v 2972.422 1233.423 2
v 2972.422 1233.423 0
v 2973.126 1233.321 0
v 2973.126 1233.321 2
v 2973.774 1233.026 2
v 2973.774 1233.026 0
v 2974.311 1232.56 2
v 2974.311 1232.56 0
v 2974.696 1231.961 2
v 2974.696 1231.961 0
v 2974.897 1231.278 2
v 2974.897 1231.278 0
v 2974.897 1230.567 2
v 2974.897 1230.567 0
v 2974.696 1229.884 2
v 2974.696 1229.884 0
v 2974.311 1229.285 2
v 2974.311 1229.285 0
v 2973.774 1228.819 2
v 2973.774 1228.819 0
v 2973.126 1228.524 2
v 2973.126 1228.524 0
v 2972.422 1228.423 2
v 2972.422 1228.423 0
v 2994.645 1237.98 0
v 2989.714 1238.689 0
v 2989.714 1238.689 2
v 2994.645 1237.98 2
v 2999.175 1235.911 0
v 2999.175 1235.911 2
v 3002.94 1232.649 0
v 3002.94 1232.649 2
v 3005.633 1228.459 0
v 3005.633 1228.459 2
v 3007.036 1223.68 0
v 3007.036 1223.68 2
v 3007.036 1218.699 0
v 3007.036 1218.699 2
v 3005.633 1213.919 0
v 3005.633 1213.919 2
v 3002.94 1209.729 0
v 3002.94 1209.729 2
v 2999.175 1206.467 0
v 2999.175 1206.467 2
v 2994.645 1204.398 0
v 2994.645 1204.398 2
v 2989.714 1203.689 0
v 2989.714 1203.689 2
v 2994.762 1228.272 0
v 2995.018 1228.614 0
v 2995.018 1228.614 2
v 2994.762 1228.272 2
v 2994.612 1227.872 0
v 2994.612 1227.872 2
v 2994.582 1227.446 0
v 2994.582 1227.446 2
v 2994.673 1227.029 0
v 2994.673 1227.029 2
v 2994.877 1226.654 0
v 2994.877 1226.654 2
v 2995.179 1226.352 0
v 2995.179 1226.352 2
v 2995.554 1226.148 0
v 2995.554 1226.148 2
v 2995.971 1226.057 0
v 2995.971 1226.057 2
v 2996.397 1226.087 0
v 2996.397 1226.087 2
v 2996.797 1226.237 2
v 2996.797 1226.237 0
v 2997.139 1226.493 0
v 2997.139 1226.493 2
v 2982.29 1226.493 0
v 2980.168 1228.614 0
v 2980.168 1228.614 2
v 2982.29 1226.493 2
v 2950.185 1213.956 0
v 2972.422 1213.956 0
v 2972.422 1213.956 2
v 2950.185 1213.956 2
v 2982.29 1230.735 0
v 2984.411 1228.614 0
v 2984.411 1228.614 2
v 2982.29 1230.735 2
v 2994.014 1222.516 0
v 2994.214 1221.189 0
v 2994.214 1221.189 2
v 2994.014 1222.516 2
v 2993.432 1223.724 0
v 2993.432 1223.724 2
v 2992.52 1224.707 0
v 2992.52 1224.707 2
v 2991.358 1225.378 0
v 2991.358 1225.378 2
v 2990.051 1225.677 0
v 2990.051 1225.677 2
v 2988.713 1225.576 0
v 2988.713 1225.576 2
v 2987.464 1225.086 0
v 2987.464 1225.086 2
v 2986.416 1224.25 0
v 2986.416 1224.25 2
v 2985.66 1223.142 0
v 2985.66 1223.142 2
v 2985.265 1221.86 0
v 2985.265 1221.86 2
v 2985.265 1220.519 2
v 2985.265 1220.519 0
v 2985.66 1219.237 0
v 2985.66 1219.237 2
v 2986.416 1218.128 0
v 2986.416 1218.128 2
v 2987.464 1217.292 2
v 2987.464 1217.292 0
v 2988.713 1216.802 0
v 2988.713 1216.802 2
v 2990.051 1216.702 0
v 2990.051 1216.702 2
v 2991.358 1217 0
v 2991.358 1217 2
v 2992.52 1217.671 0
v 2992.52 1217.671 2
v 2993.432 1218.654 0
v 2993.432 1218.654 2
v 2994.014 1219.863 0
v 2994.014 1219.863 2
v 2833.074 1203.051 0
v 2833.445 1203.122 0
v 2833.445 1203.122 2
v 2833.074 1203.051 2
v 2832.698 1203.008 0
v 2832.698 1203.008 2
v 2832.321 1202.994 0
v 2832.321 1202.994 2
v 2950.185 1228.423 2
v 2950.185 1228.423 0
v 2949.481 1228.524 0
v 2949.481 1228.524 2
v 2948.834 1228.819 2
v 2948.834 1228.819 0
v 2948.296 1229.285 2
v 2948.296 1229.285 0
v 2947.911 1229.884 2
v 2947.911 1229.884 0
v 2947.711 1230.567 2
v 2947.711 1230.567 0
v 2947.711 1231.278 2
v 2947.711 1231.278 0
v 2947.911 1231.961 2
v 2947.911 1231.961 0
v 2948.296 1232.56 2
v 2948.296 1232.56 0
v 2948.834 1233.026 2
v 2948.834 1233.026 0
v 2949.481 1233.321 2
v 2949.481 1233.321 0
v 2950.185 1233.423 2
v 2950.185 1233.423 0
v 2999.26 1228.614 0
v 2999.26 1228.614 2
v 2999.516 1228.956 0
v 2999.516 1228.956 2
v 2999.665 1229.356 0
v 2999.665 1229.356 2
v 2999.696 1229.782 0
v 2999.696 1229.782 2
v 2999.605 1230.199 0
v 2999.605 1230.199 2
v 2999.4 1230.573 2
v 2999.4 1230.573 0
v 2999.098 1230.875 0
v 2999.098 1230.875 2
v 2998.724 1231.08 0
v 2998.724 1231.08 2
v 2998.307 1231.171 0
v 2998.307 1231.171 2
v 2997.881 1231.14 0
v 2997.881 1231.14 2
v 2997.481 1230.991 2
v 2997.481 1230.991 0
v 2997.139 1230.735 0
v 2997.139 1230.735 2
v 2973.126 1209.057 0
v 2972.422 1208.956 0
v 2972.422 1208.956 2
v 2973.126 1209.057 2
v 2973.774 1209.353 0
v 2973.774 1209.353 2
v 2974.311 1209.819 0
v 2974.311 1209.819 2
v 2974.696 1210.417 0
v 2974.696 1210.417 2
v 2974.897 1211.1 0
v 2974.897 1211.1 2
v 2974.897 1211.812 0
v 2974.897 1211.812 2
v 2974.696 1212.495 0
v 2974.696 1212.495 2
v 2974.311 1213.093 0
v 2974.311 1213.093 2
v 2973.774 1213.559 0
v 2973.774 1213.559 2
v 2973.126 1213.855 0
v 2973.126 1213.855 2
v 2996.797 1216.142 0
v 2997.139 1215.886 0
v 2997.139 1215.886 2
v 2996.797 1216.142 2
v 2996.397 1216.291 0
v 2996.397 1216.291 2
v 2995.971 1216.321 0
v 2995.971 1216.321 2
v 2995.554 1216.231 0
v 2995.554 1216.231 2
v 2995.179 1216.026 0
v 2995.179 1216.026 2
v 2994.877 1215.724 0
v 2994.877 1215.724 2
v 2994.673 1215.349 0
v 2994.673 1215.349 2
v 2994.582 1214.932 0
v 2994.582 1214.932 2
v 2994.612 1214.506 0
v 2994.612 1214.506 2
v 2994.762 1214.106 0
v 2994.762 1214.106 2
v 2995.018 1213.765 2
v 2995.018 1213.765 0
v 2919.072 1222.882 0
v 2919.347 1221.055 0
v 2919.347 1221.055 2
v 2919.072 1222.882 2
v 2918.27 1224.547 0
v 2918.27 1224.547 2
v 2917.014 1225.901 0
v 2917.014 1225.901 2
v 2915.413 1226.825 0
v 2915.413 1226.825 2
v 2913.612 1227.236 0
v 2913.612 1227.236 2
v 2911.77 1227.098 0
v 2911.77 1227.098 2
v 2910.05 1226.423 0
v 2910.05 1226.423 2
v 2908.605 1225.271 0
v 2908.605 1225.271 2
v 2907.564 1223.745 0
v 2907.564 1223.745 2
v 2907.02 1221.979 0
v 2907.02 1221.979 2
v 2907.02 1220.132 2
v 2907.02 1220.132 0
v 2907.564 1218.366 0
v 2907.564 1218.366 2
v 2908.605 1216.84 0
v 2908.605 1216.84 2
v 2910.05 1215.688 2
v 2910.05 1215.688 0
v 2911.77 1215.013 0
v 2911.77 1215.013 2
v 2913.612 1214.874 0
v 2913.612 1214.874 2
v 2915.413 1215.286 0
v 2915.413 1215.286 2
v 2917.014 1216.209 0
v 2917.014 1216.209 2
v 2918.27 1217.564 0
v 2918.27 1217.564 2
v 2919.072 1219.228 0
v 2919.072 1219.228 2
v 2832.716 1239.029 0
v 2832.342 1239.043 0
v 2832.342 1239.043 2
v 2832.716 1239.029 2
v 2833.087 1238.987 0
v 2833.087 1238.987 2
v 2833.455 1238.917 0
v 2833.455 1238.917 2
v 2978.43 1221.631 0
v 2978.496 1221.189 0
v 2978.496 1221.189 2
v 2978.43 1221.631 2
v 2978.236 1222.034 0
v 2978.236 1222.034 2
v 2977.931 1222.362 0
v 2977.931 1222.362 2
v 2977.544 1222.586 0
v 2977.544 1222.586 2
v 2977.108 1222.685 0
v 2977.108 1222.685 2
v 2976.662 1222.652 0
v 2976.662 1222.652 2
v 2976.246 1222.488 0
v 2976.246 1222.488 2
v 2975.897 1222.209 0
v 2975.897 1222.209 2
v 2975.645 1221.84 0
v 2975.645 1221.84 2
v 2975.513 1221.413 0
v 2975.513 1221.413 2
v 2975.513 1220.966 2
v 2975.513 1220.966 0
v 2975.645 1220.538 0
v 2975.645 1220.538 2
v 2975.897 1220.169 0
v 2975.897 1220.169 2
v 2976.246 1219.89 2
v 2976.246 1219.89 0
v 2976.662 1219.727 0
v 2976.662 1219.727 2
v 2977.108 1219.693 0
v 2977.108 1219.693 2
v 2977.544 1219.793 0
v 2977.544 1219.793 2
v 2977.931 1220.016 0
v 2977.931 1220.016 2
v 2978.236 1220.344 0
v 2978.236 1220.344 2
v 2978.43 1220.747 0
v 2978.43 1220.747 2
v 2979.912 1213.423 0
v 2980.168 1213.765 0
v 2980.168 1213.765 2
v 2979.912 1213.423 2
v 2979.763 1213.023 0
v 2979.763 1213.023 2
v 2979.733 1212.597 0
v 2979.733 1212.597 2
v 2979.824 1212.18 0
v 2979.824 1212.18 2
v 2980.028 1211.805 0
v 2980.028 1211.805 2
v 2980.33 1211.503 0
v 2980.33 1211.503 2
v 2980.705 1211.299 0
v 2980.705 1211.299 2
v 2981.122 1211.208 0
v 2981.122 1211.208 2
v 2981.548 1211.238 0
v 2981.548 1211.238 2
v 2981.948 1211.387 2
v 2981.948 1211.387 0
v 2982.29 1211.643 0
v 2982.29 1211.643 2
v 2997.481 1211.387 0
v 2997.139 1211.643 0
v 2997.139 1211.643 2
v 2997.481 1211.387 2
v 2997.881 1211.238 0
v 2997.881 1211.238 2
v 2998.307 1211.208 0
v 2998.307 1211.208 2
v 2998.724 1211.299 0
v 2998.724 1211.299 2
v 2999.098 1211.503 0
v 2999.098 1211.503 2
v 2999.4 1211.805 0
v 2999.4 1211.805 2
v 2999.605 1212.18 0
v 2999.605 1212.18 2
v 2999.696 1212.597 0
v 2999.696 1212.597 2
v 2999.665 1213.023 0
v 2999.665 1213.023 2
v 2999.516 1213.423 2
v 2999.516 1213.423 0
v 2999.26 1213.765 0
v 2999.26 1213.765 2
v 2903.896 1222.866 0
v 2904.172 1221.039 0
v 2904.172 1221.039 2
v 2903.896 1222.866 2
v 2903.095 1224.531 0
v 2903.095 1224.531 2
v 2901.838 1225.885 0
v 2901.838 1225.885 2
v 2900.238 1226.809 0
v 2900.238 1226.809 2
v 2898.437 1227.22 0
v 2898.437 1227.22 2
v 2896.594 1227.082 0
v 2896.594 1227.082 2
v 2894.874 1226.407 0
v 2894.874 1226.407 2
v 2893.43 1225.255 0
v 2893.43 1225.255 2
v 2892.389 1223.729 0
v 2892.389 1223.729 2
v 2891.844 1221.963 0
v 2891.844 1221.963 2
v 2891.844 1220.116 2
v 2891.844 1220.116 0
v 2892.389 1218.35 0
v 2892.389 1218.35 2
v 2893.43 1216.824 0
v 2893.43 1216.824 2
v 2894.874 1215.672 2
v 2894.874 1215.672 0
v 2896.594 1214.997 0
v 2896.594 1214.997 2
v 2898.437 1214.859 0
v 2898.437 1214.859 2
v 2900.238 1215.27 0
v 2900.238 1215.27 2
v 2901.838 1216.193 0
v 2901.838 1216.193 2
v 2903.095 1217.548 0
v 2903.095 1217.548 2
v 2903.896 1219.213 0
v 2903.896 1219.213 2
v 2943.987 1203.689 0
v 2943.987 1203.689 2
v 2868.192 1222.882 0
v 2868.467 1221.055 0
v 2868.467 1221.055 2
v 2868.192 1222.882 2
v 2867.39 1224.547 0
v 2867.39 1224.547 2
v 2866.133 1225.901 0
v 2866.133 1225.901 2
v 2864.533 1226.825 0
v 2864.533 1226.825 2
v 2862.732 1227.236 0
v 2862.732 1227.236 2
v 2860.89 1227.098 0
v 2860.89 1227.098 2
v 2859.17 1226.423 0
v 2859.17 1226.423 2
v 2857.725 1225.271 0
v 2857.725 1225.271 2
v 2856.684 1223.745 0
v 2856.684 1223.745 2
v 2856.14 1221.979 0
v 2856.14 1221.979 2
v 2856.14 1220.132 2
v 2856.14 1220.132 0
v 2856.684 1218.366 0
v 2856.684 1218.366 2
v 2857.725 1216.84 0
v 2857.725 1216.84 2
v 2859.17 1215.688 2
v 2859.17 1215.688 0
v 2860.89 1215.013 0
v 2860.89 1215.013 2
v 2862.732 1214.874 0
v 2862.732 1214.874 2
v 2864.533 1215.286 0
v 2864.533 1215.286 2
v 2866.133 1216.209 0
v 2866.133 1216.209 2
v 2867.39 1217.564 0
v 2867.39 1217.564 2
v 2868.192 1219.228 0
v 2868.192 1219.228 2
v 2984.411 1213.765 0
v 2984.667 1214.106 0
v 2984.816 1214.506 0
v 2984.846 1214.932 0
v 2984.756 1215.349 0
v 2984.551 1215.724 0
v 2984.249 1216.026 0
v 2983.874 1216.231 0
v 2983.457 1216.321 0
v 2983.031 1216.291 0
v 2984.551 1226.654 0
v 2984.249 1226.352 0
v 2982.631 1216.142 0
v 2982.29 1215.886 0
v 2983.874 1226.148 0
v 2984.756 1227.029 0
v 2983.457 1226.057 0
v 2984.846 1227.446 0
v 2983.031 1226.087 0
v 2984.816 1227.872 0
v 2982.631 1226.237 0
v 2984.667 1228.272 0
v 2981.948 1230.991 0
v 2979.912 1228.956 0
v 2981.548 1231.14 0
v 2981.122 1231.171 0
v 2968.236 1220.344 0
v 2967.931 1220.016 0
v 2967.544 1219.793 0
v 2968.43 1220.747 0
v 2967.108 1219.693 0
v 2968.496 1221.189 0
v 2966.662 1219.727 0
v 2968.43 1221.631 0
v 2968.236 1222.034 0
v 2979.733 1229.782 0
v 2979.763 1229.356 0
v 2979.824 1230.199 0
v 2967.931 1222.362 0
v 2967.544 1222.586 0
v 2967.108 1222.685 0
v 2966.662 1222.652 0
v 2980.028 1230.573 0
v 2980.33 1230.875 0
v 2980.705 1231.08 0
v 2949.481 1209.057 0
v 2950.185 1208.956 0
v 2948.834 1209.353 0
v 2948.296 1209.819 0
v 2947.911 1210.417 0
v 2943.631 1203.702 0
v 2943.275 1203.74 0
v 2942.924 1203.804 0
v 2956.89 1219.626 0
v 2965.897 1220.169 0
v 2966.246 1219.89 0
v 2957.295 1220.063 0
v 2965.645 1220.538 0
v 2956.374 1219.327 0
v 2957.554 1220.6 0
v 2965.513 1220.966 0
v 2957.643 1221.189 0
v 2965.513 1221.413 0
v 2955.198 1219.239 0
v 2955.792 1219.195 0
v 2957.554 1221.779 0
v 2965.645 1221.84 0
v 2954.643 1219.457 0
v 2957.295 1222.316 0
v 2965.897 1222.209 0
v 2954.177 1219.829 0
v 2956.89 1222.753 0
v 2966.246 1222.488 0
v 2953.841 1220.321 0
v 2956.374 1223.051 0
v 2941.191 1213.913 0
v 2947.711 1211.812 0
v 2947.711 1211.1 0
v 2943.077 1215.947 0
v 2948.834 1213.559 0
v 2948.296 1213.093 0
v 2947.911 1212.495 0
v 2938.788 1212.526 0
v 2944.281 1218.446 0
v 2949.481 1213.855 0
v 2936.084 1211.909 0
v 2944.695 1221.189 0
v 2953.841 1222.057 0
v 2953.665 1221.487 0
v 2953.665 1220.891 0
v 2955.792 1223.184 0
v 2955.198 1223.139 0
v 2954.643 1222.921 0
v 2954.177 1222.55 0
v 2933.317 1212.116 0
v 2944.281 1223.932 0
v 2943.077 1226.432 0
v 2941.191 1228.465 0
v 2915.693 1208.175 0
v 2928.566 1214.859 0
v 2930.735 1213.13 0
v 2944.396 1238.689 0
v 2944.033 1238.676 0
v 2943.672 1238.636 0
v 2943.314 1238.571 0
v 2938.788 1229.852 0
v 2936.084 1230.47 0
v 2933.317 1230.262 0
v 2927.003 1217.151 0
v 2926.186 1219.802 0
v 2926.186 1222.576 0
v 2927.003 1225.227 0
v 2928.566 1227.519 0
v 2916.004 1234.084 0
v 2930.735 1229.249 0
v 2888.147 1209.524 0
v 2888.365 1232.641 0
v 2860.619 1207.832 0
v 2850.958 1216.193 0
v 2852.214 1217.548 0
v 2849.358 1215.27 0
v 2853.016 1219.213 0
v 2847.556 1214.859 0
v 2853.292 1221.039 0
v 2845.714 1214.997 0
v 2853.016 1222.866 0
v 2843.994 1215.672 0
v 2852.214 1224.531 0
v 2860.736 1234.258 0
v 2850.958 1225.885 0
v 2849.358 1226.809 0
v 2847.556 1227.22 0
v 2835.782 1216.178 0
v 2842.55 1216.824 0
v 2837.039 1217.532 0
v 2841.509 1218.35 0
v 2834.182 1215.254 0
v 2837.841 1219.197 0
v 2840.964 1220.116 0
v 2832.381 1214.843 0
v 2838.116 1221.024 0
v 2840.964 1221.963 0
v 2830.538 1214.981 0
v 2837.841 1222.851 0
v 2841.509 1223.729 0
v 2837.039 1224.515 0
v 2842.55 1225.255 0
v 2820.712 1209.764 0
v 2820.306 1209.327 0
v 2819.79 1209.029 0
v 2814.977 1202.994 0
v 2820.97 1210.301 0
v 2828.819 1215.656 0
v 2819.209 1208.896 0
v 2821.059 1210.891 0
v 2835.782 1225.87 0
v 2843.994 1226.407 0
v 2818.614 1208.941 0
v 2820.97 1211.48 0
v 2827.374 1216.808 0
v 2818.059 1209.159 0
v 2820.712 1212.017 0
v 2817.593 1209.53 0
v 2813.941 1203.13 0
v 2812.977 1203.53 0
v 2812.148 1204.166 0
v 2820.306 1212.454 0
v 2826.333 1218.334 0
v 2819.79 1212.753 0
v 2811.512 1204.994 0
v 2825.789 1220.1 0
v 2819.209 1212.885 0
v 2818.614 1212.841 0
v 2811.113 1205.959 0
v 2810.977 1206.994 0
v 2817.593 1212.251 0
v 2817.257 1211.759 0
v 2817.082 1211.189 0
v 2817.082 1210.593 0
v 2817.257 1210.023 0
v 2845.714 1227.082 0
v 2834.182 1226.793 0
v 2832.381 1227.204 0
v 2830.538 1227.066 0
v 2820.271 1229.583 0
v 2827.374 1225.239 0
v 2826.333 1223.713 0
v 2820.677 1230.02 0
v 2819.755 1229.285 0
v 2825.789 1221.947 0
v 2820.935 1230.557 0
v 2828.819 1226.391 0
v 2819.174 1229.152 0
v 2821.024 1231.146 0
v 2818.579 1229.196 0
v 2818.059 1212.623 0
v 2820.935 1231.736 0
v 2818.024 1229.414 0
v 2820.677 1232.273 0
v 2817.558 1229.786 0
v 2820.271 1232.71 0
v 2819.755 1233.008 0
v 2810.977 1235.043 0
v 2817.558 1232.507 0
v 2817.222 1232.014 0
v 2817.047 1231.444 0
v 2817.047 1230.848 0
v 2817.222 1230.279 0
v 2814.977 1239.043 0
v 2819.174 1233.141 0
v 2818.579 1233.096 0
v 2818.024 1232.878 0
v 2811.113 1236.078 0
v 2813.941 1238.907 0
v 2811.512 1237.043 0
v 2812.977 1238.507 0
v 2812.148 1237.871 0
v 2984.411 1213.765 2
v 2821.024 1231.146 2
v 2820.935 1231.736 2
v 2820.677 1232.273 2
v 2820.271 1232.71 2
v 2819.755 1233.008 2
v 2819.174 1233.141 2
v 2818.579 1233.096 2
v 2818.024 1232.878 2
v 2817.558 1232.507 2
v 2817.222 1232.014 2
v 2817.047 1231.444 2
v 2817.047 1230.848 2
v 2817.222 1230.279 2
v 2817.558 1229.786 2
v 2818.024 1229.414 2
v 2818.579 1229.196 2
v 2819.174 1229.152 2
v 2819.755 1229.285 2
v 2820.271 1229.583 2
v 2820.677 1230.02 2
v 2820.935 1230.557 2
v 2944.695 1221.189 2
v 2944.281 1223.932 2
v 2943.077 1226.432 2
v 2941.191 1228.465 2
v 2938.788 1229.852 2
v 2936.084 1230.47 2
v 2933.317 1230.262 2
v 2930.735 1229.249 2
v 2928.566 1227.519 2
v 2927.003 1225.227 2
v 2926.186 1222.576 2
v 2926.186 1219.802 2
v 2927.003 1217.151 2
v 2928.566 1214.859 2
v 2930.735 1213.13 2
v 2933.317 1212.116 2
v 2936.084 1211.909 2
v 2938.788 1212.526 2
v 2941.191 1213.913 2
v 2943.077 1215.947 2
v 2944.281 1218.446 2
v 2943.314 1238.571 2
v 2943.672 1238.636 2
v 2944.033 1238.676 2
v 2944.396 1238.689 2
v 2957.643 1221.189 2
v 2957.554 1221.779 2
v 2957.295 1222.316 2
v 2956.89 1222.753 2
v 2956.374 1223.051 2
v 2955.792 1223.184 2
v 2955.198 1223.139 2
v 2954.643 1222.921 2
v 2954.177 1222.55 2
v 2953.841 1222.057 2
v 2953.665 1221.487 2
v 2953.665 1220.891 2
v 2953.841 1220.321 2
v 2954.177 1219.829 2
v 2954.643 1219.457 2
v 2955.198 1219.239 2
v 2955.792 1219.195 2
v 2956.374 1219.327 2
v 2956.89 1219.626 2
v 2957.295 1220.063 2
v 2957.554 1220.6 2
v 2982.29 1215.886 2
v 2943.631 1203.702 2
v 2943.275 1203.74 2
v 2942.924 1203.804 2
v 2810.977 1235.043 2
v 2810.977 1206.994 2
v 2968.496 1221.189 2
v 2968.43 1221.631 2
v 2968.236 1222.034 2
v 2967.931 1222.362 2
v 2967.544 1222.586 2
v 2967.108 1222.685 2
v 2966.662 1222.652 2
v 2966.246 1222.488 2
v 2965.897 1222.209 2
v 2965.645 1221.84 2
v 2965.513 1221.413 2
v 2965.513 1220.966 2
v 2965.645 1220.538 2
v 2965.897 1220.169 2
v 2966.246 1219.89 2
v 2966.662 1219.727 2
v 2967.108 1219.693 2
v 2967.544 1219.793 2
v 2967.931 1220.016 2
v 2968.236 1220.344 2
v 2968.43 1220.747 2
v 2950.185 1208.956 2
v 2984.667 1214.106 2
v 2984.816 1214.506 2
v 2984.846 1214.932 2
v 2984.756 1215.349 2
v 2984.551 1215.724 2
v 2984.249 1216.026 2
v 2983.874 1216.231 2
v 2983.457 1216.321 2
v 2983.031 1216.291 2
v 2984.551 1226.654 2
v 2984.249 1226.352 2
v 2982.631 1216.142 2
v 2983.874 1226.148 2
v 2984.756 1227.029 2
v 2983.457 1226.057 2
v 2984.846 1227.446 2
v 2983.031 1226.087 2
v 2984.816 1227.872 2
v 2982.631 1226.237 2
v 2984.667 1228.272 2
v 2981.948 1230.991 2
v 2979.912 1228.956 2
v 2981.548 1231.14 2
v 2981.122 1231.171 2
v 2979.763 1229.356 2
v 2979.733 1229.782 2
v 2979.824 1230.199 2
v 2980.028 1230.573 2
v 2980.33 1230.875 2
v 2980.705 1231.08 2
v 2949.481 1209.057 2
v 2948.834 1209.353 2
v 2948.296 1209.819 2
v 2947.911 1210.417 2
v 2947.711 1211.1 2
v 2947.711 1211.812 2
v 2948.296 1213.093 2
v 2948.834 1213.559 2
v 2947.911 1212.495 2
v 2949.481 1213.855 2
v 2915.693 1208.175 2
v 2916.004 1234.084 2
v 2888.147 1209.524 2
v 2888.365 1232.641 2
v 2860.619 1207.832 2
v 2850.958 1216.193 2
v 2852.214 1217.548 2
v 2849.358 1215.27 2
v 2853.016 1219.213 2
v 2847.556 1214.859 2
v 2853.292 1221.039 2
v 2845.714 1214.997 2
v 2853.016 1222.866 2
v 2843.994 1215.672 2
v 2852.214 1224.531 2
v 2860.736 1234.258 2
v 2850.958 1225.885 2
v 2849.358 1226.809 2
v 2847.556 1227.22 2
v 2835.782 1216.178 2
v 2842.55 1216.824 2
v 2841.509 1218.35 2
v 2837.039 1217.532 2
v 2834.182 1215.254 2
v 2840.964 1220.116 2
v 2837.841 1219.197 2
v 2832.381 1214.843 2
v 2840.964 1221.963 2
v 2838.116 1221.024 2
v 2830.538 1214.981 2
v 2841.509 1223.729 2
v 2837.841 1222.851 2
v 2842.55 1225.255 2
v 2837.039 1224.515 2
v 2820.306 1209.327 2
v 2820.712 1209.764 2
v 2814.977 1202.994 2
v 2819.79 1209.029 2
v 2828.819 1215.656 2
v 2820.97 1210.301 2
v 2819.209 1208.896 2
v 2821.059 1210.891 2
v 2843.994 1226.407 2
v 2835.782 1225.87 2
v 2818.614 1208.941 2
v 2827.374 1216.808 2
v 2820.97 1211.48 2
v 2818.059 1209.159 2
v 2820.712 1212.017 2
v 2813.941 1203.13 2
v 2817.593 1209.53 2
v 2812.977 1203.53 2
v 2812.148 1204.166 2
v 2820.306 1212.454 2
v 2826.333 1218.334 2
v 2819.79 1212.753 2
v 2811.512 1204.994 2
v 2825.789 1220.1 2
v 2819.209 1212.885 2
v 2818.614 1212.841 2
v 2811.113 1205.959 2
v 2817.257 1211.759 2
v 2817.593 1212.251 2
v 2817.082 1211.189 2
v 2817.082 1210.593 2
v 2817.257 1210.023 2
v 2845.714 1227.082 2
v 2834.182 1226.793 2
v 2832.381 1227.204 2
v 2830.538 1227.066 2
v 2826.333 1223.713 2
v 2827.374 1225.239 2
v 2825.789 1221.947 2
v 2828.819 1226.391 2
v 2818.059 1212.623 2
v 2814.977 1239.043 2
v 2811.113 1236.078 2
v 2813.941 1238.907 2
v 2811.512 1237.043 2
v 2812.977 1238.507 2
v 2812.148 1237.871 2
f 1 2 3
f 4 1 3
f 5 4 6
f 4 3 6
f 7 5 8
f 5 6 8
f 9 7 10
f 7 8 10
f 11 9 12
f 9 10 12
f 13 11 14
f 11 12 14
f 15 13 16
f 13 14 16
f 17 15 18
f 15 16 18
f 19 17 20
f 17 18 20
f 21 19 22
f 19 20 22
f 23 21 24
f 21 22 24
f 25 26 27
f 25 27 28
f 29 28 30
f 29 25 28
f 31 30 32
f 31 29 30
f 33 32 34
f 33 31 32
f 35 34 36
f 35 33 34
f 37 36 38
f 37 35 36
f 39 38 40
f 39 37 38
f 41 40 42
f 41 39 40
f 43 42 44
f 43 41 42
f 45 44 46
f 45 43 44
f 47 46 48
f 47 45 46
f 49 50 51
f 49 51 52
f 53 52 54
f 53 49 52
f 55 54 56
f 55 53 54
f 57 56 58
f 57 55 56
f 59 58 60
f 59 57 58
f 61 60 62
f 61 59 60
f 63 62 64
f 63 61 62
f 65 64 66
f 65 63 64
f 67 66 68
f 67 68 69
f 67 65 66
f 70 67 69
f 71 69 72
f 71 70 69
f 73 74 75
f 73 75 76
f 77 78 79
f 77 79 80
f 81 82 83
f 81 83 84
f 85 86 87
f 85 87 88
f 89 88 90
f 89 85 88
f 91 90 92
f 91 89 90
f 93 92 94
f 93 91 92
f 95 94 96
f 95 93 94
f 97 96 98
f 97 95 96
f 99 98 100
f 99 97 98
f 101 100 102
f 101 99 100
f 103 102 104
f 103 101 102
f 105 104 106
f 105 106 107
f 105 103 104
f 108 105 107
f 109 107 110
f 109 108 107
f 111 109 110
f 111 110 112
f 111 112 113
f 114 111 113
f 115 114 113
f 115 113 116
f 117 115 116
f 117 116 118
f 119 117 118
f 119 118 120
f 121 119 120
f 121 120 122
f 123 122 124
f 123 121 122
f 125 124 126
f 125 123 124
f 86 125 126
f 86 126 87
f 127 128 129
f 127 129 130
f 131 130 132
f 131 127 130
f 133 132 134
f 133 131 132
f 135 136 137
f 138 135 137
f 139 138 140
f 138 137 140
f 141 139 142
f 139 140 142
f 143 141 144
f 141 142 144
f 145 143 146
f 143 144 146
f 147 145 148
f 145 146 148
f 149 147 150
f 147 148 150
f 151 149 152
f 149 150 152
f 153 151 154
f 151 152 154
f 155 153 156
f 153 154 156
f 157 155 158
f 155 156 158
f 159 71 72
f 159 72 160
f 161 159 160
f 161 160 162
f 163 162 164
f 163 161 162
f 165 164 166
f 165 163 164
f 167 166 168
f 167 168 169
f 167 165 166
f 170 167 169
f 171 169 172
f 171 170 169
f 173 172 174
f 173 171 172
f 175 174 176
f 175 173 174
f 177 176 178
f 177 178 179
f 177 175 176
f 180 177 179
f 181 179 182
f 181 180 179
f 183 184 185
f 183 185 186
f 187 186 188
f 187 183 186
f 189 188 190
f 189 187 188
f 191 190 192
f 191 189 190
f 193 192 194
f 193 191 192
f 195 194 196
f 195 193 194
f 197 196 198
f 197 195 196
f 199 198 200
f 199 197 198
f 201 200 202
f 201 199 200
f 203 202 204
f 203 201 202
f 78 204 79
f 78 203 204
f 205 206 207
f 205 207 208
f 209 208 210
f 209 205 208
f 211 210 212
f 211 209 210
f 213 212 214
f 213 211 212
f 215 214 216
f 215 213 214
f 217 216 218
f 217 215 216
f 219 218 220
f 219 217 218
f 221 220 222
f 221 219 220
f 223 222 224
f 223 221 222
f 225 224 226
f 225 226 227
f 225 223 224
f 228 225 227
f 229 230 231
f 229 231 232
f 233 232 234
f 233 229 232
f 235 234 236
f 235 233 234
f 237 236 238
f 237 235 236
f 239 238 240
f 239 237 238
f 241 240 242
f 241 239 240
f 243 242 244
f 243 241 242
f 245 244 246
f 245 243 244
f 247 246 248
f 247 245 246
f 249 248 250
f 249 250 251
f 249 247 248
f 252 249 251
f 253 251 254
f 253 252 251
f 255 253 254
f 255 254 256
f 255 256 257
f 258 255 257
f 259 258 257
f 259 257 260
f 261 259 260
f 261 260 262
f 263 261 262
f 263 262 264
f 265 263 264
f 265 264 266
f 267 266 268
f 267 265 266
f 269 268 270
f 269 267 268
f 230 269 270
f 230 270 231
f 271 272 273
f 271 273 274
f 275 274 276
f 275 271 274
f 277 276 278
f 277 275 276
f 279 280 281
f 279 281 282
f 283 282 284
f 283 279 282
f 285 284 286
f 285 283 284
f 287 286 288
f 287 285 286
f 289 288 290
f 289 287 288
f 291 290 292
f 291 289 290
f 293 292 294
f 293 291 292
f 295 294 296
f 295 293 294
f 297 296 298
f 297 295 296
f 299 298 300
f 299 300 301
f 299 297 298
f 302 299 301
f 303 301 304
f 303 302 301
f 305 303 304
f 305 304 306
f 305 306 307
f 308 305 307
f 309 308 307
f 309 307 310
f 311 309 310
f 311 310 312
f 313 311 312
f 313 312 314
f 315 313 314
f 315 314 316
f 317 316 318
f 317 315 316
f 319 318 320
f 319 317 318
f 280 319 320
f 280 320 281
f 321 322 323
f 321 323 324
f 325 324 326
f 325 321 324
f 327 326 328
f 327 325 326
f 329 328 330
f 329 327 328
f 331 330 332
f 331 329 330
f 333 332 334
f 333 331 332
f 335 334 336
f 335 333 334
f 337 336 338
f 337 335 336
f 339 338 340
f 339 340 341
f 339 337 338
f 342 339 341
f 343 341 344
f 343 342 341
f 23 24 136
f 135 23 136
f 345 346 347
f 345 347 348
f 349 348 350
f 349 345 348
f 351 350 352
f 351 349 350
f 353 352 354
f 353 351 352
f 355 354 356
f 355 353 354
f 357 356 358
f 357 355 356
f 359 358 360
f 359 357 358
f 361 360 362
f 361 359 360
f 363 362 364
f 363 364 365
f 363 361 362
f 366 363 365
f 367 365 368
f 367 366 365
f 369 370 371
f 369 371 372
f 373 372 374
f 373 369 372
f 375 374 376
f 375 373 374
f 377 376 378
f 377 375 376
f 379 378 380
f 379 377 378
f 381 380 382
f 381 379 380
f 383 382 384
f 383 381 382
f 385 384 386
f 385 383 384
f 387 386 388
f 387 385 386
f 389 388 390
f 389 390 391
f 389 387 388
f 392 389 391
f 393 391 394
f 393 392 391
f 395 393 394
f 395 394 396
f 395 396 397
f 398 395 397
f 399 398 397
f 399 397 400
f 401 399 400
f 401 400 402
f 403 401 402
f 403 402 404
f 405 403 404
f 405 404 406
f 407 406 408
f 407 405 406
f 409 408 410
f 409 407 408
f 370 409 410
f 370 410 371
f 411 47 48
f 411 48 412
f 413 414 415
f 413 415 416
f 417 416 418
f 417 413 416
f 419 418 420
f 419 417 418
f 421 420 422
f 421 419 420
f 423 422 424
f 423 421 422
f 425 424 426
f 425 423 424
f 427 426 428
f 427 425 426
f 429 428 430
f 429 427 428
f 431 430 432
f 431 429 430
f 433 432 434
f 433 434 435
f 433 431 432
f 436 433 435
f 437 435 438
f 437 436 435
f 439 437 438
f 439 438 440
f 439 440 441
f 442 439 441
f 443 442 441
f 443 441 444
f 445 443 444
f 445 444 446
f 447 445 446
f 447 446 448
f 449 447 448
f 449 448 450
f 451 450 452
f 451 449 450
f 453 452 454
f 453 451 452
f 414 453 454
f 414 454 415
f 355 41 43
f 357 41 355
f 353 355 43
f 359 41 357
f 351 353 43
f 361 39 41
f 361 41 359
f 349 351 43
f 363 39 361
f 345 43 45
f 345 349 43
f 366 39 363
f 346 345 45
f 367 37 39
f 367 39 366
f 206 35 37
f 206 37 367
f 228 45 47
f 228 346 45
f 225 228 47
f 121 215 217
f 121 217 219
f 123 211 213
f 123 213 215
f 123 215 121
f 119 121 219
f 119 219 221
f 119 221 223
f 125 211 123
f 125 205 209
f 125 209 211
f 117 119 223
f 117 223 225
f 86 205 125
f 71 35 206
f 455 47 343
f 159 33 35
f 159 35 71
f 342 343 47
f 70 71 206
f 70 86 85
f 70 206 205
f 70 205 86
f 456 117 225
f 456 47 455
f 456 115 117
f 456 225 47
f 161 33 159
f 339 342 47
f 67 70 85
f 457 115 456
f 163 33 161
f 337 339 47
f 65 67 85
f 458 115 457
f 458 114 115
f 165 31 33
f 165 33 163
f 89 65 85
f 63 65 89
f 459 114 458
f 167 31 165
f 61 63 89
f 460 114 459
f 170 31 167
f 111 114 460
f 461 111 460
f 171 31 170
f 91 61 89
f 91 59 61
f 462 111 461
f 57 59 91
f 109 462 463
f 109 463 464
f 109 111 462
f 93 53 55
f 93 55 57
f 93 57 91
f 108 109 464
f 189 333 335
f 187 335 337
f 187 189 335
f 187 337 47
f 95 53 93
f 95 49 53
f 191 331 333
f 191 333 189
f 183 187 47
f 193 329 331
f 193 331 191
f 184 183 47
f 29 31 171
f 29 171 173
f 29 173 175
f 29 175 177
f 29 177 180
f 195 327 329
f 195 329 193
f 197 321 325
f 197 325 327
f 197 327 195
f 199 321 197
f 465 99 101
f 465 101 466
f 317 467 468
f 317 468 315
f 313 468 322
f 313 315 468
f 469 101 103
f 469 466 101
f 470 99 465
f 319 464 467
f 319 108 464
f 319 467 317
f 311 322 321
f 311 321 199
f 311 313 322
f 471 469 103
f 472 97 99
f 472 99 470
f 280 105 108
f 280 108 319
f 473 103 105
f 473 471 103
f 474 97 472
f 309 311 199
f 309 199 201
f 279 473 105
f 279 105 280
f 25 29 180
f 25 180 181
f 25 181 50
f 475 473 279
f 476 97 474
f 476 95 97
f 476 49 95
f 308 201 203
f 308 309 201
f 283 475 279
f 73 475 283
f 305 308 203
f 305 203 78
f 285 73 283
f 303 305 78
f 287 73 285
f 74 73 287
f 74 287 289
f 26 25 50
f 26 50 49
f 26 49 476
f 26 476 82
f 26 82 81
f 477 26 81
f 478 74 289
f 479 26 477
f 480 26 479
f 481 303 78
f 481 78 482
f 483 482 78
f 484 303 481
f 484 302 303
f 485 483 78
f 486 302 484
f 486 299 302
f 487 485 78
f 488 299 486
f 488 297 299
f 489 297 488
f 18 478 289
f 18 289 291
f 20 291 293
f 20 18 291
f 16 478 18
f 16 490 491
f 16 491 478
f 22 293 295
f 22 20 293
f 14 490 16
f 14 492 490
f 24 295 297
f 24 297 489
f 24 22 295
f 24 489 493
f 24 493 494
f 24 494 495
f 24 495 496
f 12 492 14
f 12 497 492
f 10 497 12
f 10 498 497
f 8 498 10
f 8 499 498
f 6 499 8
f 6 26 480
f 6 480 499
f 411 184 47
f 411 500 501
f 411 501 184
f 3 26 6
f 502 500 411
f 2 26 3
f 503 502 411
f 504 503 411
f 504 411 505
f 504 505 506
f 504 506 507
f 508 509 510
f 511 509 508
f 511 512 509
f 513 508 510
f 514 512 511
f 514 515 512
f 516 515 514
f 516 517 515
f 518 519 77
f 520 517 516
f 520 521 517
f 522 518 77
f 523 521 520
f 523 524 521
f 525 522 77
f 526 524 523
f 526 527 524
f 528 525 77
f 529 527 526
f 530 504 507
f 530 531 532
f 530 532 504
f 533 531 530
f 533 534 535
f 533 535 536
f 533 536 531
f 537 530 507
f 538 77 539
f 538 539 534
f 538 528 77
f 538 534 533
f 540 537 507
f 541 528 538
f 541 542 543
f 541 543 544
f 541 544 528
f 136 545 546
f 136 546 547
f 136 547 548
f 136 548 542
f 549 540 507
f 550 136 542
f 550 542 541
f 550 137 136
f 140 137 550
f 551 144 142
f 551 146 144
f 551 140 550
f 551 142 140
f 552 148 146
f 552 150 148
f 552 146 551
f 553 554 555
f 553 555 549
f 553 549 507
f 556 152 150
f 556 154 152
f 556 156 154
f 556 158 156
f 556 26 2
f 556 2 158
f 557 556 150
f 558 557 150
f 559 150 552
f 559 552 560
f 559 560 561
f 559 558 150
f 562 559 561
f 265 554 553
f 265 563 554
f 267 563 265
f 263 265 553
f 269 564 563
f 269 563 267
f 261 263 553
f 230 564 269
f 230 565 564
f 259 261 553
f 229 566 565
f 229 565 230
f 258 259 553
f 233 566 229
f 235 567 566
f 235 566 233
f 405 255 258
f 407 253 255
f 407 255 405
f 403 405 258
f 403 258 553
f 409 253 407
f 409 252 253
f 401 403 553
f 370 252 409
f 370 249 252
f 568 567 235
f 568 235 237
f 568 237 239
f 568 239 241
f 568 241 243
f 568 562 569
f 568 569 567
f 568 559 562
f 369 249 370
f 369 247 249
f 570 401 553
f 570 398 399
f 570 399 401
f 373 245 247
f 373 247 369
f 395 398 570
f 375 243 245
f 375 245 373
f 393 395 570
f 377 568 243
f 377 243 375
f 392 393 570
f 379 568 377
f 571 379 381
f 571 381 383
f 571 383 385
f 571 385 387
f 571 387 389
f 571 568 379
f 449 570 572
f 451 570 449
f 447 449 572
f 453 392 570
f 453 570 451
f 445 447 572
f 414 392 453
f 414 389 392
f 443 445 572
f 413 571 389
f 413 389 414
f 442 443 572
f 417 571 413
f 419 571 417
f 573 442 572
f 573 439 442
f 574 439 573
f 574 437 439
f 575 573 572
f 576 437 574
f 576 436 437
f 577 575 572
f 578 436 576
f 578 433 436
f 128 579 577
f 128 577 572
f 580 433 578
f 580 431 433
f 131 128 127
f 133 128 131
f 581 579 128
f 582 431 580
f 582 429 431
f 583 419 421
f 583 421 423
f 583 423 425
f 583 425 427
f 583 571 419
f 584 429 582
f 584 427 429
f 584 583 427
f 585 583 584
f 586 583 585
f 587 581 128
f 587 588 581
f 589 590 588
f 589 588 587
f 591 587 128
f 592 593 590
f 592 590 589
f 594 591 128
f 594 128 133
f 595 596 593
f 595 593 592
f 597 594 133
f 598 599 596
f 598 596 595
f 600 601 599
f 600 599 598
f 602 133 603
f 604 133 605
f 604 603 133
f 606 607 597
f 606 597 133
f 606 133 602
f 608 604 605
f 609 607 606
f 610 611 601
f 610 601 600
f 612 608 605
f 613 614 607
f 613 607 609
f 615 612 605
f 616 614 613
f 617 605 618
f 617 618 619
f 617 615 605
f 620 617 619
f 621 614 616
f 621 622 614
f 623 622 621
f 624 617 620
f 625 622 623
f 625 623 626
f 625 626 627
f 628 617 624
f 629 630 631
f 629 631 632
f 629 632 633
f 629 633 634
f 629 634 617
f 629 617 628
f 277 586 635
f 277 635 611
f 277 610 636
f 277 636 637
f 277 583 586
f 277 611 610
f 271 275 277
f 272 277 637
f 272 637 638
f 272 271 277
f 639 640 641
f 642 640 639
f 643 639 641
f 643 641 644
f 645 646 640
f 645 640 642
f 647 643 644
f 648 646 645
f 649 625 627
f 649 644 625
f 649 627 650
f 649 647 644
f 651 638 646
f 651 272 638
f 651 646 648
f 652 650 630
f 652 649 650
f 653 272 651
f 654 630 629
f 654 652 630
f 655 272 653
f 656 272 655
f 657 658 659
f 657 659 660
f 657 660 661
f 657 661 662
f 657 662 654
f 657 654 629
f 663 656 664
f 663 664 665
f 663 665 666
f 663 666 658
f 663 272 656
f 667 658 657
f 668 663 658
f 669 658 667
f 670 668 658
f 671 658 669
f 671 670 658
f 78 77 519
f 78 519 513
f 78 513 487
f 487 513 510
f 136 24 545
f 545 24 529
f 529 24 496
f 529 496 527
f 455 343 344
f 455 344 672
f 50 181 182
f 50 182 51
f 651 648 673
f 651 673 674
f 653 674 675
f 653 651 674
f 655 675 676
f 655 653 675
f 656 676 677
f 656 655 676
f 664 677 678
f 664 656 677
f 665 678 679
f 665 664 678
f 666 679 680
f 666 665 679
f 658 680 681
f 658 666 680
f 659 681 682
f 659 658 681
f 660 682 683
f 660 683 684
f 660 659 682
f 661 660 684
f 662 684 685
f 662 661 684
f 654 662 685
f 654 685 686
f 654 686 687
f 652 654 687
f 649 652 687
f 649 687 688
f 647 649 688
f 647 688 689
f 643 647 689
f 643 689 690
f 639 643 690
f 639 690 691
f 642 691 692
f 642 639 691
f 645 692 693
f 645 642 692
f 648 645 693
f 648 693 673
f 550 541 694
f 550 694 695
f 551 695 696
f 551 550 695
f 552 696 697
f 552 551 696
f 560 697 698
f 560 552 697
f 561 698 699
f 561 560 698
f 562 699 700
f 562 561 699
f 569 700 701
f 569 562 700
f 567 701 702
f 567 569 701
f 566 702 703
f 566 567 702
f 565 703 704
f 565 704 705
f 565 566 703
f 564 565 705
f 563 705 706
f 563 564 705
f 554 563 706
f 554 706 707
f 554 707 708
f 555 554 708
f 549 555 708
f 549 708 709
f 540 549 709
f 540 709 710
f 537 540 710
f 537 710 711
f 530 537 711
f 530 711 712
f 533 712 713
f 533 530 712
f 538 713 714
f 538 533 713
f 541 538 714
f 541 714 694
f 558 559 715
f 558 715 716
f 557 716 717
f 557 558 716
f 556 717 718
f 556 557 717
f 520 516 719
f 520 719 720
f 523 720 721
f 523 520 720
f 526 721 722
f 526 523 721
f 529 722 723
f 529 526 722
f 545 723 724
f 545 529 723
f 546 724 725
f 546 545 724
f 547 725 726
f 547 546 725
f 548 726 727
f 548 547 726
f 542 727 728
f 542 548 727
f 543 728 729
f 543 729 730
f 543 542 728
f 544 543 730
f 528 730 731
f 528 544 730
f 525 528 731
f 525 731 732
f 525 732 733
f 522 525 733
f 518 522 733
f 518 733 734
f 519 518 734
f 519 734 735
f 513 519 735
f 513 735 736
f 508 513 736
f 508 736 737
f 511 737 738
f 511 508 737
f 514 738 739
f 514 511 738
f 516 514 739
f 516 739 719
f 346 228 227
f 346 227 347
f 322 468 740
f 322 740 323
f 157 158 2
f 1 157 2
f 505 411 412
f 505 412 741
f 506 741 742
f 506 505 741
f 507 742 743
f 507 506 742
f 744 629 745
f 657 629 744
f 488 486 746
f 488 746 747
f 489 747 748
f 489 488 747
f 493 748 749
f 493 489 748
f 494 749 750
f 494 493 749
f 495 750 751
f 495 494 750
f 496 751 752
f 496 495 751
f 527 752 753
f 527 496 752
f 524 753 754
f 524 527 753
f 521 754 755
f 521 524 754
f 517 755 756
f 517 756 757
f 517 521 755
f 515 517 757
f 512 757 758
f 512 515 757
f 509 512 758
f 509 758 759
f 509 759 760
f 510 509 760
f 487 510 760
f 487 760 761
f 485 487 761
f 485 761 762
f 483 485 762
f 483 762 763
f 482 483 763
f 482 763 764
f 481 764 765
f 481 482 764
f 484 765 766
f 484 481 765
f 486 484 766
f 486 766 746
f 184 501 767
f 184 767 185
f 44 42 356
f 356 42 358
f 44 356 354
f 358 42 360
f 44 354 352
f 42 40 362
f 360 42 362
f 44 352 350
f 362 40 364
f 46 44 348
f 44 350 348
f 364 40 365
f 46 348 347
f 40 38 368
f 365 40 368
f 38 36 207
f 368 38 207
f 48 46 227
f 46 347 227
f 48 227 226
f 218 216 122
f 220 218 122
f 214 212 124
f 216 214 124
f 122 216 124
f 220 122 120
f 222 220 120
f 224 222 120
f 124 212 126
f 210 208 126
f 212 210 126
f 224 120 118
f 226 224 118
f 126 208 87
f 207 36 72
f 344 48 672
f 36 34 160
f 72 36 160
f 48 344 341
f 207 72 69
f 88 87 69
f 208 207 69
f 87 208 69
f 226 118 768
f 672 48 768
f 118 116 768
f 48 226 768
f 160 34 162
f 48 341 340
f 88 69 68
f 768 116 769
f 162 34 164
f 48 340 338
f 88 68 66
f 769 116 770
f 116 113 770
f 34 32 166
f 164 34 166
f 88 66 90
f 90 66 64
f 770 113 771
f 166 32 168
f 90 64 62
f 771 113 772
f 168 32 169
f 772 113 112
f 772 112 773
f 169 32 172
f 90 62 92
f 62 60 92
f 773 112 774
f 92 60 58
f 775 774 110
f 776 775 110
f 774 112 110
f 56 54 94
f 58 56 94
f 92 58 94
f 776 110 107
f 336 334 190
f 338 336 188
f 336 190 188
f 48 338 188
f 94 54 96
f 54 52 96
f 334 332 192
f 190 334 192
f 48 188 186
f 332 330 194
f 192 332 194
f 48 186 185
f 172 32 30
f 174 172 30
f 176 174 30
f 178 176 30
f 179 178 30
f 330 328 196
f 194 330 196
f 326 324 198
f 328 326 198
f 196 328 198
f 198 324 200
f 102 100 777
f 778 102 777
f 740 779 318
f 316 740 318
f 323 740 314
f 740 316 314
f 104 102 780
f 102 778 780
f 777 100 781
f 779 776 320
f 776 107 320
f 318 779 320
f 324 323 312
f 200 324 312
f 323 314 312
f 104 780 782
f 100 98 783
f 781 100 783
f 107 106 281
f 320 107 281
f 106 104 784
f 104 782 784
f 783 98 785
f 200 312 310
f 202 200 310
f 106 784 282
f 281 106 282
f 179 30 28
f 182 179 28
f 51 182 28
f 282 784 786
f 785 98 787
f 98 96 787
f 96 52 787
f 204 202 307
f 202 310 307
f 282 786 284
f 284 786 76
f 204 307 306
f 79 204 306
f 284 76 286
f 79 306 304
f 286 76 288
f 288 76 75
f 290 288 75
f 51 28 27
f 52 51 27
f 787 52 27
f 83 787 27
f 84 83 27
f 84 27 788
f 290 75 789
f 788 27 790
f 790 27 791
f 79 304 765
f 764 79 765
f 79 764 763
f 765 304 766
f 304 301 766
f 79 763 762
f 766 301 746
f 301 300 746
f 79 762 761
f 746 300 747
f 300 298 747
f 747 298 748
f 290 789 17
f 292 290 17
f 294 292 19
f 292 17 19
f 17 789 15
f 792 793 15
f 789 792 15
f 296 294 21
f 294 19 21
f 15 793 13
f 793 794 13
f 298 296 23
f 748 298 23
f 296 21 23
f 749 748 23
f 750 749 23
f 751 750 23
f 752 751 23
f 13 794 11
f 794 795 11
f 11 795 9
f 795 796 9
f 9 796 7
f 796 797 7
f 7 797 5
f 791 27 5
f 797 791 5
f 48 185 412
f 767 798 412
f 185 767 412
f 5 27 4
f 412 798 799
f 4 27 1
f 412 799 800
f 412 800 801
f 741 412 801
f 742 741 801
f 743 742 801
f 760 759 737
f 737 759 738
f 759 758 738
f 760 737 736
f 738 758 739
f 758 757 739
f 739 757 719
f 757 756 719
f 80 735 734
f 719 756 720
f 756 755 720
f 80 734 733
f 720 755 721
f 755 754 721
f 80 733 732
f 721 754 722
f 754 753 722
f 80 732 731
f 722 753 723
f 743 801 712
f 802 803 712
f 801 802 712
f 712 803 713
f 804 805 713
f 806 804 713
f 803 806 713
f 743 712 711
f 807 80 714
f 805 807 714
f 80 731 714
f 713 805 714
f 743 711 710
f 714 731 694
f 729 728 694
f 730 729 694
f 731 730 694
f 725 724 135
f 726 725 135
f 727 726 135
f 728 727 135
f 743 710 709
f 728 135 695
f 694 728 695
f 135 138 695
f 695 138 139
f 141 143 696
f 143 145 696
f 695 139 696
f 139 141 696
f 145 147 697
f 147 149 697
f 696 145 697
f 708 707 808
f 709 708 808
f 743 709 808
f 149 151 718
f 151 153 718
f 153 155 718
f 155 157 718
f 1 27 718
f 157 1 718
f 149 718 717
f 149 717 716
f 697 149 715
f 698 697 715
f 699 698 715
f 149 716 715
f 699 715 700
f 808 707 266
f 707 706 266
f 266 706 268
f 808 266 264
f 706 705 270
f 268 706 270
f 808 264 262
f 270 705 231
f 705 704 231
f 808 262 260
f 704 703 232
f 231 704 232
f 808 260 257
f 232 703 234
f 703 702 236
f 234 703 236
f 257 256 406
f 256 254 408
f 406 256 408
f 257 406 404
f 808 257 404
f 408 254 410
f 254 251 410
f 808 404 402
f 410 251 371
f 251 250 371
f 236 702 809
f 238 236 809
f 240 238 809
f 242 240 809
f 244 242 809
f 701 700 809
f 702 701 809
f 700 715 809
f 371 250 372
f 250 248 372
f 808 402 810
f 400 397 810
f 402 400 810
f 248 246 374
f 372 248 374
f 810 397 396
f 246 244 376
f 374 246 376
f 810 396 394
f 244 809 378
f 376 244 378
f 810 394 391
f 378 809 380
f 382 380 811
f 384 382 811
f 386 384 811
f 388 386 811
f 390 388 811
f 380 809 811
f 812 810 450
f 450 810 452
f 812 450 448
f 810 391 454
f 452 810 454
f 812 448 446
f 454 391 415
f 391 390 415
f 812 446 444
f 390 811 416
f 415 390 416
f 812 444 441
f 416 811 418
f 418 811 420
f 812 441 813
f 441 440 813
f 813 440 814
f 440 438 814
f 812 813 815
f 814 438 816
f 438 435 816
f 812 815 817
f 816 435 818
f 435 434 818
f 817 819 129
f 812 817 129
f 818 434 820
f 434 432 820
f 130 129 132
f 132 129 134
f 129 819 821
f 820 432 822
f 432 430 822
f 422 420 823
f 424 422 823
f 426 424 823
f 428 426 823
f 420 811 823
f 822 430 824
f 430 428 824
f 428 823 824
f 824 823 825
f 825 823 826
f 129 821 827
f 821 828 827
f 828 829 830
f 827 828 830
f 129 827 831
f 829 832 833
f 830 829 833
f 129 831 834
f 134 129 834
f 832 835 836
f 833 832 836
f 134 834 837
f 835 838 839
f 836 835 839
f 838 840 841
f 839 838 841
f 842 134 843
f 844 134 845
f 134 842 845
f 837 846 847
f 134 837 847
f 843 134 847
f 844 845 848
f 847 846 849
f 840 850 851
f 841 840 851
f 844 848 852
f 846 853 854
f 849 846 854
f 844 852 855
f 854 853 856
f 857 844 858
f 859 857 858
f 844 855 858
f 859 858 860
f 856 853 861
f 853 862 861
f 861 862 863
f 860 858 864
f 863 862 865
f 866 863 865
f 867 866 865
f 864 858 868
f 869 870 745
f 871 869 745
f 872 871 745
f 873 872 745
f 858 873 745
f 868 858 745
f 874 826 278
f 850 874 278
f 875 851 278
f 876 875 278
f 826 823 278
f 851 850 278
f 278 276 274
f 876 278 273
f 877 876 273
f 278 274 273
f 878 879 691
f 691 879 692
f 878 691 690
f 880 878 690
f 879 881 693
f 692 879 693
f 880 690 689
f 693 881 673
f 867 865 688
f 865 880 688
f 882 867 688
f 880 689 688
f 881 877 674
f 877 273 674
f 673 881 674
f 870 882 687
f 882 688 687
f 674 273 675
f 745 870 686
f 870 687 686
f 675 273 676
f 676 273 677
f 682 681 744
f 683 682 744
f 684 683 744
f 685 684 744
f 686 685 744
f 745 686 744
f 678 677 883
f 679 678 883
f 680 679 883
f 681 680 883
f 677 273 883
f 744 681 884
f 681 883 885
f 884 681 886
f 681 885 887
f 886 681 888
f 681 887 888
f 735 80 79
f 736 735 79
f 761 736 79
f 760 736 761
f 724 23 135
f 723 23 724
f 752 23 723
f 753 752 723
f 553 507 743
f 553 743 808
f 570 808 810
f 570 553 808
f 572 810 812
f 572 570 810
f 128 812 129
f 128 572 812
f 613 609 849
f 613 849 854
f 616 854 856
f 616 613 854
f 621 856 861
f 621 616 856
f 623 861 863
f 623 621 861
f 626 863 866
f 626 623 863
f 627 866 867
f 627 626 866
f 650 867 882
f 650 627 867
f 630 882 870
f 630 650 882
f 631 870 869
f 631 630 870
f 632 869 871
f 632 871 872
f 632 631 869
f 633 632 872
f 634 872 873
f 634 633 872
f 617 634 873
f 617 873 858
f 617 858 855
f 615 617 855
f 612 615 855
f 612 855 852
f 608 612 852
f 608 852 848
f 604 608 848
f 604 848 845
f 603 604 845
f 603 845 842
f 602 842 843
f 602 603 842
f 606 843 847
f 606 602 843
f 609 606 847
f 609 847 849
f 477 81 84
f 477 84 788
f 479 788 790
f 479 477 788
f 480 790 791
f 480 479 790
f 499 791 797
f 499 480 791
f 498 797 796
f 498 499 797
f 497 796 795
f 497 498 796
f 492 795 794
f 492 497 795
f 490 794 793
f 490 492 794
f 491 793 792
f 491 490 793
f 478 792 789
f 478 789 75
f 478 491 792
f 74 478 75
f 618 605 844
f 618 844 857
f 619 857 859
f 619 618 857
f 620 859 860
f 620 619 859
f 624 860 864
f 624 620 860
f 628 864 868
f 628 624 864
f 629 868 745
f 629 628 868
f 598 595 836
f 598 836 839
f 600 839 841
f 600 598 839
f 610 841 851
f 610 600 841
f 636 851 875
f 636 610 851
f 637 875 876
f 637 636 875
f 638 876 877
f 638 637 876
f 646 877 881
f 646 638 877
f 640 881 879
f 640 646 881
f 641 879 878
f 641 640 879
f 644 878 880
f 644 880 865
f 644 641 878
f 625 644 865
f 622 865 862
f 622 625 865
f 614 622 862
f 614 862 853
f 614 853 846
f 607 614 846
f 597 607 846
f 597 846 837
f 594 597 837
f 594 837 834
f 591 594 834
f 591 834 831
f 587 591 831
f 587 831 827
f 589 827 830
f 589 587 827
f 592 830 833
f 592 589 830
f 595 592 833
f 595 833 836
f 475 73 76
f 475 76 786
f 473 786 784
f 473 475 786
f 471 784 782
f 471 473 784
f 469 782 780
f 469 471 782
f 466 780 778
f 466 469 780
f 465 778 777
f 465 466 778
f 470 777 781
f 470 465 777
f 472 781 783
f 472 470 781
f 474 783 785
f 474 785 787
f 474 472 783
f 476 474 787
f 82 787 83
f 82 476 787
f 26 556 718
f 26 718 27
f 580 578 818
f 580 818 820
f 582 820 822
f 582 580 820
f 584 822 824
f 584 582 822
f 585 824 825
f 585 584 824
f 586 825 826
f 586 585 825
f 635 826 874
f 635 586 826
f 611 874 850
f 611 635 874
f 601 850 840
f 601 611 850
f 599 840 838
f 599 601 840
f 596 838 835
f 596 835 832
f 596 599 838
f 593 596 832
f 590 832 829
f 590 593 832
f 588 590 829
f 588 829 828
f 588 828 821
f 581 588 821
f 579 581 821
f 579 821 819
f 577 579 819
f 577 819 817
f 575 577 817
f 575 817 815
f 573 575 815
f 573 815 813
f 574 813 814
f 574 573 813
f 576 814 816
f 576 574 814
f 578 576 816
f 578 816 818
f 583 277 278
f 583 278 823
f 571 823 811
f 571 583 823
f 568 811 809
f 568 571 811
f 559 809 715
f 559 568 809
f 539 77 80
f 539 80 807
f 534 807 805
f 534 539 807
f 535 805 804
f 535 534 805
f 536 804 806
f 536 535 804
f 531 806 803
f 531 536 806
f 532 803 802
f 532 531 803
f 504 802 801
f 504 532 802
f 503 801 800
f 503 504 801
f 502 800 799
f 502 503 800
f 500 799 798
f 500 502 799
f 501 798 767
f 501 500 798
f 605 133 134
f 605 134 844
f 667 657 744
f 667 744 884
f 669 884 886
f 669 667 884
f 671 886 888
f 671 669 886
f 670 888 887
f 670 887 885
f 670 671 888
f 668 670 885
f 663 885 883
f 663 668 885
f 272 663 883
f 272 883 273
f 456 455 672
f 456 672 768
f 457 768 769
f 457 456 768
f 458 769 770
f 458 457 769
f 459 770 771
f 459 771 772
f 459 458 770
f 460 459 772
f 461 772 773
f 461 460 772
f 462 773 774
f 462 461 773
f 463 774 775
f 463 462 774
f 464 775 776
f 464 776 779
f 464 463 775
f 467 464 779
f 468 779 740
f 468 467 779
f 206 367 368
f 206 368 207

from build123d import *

# Parameters (mm, degrees)
CROQUIS1_R              = 2
CROQUIS1_R_2            = 4.5
CROQUIS1_R_3            = 6.198274882
CROQUIS1_R_4            = 1.5
CROQUIS1_R_5            = 9.306378824
SALIENTE_EXTRUIR1_DEPTH = 2


with BuildPart() as part:
    # Croquis1 → Saliente-Extruir1 (new body)
    with BuildSketch(Plane.XY):
        with BuildLine():
            Line((2814.976573627, 1239.042814145), (2832.341923679, 1239.042814145))
            ThreePointArc((2832.341923679, 1239.042814145), (2832.901941116, 1239.011353213), (2833.454911085, 1238.917366333))
            ThreePointArc((2833.454911085, 1238.917366333), (2888.36527428, 1232.640523344), (2943.314155481, 1238.570717173))
            ThreePointArc((2943.314155481, 1238.570717173), (2943.852021738, 1238.659519694), (2944.396358769, 1238.689238294))
            Line((2944.396358769, 1238.689238294), (2989.714258788, 1238.689238294))
            ThreePointArc((2989.714258788, 1238.689238294), (3007.214258788, 1221.189238294), (2989.714258788, 1203.689238294))
            Line((2989.714258788, 1203.689238294), (2943.987436651, 1203.689238294))
            ThreePointArc((2943.987436651, 1203.689238294), (2943.452657793, 1203.717919397), (2942.924014155, 1203.803633664))
            ThreePointArc((2942.924014155, 1203.803633664), (2888.146718467, 1209.523748699), (2833.444892603, 1203.122023463))
            ThreePointArc((2833.444892603, 1203.122023463), (2832.886438978, 1203.026115147), (2832.320719962, 1202.994008262))
            Line((2832.320719962, 1202.994008262), (2814.976573627, 1202.994008262))
            ThreePointArc((2814.976573627, 1202.994008262), (2812.148146502, 1204.165581137), (2810.976573627, 1206.994008262))
            Line((2810.976573627, 1206.994008262), (2810.976573627, 1235.042814145))
            ThreePointArc((2810.976573627, 1235.042814145), (2812.148146502, 1237.871241269), (2814.976573627, 1239.042814145))
        make_face()
        with Locations((2819.024210059, 1231.146271353)):
            Circle(CROQUIS1_R, mode=Mode.SUBTRACT)
        with Locations((2989.714258788, 1221.189238294)):
            Circle(CROQUIS1_R_2, mode=Mode.SUBTRACT)
        with Locations((2819.05924577, 1210.890776447)):
            Circle(CROQUIS1_R, mode=Mode.SUBTRACT)
        with Locations((2831.917693785, 1221.023549437)):
            Circle(CROQUIS1_R_3, mode=Mode.SUBTRACT)
        with Locations((2847.093240202, 1221.039483998)):
            Circle(CROQUIS1_R_3, mode=Mode.SUBTRACT)
        with Locations((2862.26878662, 1221.055418559)):
            Circle(CROQUIS1_R_3, mode=Mode.SUBTRACT)
        with Locations((2966.996257677, 1221.189238294)):
            Circle(CROQUIS1_R_4, mode=Mode.SUBTRACT)
        with Locations((2976.996257677, 1221.189238294)):
            Circle(CROQUIS1_R_4, mode=Mode.SUBTRACT)
        with Locations((2955.642950592, 1221.189238294)):
            Circle(CROQUIS1_R, mode=Mode.SUBTRACT)
        with Locations((2935.388208278, 1221.189238294)):
            Circle(CROQUIS1_R_5, mode=Mode.SUBTRACT)
        with Locations((2897.973392618, 1221.039483998)):
            Circle(CROQUIS1_R_3, mode=Mode.SUBTRACT)
        with Locations((2913.148939036, 1221.055418559)):
            Circle(CROQUIS1_R_3, mode=Mode.SUBTRACT)
        with BuildLine():
            Line((2982.289637586, 1215.885937435), (2980.168317242, 1213.764617091))
            ThreePointArc((2980.168317242, 1213.764617091), (2980.168317242, 1211.643296748), (2982.289637586, 1211.643296748))
            Line((2982.289637586, 1211.643296748), (2984.410957929, 1213.764617091))
            ThreePointArc((2984.410957929, 1213.764617091), (2984.410957929, 1215.885937435), (2982.289637586, 1215.885937435))
        make_face(mode=Mode.SUBTRACT)
        with BuildLine():
            Line((2995.017559647, 1213.764617091), (2997.138879991, 1211.643296748))
            ThreePointArc((2997.138879991, 1211.643296748), (2999.260200334, 1211.643296748), (2999.260200334, 1213.764617091))
            Line((2999.260200334, 1213.764617091), (2997.138879991, 1215.885937435))
            ThreePointArc((2997.138879991, 1215.885937435), (2995.017559647, 1215.885937435), (2995.017559647, 1213.764617091))
        make_face(mode=Mode.SUBTRACT)
        with BuildLine():
            Line((2997.138879991, 1226.492539153), (2999.260200334, 1228.613859496))
            ThreePointArc((2999.260200334, 1228.613859496), (2999.260200334, 1230.73517984), (2997.138879991, 1230.73517984))
            Line((2997.138879991, 1230.73517984), (2995.017559647, 1228.613859496))
            ThreePointArc((2995.017559647, 1228.613859496), (2995.017559647, 1226.492539153), (2997.138879991, 1226.492539153))
        make_face(mode=Mode.SUBTRACT)
        with BuildLine():
            Line((2984.410957929, 1228.613859496), (2982.289637586, 1230.73517984))
            ThreePointArc((2982.289637586, 1230.73517984), (2980.168317242, 1230.73517984), (2980.168317242, 1228.613859496))
            Line((2980.168317242, 1228.613859496), (2982.289637586, 1226.492539153))
            ThreePointArc((2982.289637586, 1226.492539153), (2984.410957929, 1226.492539153), (2984.410957929, 1228.613859496))
        make_face(mode=Mode.SUBTRACT)
        with BuildLine():
            Line((2950.185413449, 1233.422506858), (2972.422006236, 1233.422506858))
            ThreePointArc((2972.422006236, 1233.422506858), (2974.922006236, 1230.922506858), (2972.422006236, 1228.422506858))
            Line((2972.422006236, 1228.422506858), (2950.185413449, 1228.422506858))
            ThreePointArc((2950.185413449, 1228.422506858), (2947.685413449, 1230.922506858), (2950.185413449, 1233.422506858))
        make_face(mode=Mode.SUBTRACT)
        with BuildLine():
            Line((2950.185413449, 1208.955969729), (2972.422006236, 1208.955969729))
            ThreePointArc((2972.422006236, 1208.955969729), (2974.922006236, 1211.455969729), (2972.422006236, 1213.955969729))
            Line((2972.422006236, 1213.955969729), (2950.185413449, 1213.955969729))
            ThreePointArc((2950.185413449, 1213.955969729), (2947.685413449, 1211.455969729), (2950.185413449, 1208.955969729))
        make_face(mode=Mode.SUBTRACT)
    extrude(amount=SALIENTE_EXTRUIR1_DEPTH)


solid = part.part
